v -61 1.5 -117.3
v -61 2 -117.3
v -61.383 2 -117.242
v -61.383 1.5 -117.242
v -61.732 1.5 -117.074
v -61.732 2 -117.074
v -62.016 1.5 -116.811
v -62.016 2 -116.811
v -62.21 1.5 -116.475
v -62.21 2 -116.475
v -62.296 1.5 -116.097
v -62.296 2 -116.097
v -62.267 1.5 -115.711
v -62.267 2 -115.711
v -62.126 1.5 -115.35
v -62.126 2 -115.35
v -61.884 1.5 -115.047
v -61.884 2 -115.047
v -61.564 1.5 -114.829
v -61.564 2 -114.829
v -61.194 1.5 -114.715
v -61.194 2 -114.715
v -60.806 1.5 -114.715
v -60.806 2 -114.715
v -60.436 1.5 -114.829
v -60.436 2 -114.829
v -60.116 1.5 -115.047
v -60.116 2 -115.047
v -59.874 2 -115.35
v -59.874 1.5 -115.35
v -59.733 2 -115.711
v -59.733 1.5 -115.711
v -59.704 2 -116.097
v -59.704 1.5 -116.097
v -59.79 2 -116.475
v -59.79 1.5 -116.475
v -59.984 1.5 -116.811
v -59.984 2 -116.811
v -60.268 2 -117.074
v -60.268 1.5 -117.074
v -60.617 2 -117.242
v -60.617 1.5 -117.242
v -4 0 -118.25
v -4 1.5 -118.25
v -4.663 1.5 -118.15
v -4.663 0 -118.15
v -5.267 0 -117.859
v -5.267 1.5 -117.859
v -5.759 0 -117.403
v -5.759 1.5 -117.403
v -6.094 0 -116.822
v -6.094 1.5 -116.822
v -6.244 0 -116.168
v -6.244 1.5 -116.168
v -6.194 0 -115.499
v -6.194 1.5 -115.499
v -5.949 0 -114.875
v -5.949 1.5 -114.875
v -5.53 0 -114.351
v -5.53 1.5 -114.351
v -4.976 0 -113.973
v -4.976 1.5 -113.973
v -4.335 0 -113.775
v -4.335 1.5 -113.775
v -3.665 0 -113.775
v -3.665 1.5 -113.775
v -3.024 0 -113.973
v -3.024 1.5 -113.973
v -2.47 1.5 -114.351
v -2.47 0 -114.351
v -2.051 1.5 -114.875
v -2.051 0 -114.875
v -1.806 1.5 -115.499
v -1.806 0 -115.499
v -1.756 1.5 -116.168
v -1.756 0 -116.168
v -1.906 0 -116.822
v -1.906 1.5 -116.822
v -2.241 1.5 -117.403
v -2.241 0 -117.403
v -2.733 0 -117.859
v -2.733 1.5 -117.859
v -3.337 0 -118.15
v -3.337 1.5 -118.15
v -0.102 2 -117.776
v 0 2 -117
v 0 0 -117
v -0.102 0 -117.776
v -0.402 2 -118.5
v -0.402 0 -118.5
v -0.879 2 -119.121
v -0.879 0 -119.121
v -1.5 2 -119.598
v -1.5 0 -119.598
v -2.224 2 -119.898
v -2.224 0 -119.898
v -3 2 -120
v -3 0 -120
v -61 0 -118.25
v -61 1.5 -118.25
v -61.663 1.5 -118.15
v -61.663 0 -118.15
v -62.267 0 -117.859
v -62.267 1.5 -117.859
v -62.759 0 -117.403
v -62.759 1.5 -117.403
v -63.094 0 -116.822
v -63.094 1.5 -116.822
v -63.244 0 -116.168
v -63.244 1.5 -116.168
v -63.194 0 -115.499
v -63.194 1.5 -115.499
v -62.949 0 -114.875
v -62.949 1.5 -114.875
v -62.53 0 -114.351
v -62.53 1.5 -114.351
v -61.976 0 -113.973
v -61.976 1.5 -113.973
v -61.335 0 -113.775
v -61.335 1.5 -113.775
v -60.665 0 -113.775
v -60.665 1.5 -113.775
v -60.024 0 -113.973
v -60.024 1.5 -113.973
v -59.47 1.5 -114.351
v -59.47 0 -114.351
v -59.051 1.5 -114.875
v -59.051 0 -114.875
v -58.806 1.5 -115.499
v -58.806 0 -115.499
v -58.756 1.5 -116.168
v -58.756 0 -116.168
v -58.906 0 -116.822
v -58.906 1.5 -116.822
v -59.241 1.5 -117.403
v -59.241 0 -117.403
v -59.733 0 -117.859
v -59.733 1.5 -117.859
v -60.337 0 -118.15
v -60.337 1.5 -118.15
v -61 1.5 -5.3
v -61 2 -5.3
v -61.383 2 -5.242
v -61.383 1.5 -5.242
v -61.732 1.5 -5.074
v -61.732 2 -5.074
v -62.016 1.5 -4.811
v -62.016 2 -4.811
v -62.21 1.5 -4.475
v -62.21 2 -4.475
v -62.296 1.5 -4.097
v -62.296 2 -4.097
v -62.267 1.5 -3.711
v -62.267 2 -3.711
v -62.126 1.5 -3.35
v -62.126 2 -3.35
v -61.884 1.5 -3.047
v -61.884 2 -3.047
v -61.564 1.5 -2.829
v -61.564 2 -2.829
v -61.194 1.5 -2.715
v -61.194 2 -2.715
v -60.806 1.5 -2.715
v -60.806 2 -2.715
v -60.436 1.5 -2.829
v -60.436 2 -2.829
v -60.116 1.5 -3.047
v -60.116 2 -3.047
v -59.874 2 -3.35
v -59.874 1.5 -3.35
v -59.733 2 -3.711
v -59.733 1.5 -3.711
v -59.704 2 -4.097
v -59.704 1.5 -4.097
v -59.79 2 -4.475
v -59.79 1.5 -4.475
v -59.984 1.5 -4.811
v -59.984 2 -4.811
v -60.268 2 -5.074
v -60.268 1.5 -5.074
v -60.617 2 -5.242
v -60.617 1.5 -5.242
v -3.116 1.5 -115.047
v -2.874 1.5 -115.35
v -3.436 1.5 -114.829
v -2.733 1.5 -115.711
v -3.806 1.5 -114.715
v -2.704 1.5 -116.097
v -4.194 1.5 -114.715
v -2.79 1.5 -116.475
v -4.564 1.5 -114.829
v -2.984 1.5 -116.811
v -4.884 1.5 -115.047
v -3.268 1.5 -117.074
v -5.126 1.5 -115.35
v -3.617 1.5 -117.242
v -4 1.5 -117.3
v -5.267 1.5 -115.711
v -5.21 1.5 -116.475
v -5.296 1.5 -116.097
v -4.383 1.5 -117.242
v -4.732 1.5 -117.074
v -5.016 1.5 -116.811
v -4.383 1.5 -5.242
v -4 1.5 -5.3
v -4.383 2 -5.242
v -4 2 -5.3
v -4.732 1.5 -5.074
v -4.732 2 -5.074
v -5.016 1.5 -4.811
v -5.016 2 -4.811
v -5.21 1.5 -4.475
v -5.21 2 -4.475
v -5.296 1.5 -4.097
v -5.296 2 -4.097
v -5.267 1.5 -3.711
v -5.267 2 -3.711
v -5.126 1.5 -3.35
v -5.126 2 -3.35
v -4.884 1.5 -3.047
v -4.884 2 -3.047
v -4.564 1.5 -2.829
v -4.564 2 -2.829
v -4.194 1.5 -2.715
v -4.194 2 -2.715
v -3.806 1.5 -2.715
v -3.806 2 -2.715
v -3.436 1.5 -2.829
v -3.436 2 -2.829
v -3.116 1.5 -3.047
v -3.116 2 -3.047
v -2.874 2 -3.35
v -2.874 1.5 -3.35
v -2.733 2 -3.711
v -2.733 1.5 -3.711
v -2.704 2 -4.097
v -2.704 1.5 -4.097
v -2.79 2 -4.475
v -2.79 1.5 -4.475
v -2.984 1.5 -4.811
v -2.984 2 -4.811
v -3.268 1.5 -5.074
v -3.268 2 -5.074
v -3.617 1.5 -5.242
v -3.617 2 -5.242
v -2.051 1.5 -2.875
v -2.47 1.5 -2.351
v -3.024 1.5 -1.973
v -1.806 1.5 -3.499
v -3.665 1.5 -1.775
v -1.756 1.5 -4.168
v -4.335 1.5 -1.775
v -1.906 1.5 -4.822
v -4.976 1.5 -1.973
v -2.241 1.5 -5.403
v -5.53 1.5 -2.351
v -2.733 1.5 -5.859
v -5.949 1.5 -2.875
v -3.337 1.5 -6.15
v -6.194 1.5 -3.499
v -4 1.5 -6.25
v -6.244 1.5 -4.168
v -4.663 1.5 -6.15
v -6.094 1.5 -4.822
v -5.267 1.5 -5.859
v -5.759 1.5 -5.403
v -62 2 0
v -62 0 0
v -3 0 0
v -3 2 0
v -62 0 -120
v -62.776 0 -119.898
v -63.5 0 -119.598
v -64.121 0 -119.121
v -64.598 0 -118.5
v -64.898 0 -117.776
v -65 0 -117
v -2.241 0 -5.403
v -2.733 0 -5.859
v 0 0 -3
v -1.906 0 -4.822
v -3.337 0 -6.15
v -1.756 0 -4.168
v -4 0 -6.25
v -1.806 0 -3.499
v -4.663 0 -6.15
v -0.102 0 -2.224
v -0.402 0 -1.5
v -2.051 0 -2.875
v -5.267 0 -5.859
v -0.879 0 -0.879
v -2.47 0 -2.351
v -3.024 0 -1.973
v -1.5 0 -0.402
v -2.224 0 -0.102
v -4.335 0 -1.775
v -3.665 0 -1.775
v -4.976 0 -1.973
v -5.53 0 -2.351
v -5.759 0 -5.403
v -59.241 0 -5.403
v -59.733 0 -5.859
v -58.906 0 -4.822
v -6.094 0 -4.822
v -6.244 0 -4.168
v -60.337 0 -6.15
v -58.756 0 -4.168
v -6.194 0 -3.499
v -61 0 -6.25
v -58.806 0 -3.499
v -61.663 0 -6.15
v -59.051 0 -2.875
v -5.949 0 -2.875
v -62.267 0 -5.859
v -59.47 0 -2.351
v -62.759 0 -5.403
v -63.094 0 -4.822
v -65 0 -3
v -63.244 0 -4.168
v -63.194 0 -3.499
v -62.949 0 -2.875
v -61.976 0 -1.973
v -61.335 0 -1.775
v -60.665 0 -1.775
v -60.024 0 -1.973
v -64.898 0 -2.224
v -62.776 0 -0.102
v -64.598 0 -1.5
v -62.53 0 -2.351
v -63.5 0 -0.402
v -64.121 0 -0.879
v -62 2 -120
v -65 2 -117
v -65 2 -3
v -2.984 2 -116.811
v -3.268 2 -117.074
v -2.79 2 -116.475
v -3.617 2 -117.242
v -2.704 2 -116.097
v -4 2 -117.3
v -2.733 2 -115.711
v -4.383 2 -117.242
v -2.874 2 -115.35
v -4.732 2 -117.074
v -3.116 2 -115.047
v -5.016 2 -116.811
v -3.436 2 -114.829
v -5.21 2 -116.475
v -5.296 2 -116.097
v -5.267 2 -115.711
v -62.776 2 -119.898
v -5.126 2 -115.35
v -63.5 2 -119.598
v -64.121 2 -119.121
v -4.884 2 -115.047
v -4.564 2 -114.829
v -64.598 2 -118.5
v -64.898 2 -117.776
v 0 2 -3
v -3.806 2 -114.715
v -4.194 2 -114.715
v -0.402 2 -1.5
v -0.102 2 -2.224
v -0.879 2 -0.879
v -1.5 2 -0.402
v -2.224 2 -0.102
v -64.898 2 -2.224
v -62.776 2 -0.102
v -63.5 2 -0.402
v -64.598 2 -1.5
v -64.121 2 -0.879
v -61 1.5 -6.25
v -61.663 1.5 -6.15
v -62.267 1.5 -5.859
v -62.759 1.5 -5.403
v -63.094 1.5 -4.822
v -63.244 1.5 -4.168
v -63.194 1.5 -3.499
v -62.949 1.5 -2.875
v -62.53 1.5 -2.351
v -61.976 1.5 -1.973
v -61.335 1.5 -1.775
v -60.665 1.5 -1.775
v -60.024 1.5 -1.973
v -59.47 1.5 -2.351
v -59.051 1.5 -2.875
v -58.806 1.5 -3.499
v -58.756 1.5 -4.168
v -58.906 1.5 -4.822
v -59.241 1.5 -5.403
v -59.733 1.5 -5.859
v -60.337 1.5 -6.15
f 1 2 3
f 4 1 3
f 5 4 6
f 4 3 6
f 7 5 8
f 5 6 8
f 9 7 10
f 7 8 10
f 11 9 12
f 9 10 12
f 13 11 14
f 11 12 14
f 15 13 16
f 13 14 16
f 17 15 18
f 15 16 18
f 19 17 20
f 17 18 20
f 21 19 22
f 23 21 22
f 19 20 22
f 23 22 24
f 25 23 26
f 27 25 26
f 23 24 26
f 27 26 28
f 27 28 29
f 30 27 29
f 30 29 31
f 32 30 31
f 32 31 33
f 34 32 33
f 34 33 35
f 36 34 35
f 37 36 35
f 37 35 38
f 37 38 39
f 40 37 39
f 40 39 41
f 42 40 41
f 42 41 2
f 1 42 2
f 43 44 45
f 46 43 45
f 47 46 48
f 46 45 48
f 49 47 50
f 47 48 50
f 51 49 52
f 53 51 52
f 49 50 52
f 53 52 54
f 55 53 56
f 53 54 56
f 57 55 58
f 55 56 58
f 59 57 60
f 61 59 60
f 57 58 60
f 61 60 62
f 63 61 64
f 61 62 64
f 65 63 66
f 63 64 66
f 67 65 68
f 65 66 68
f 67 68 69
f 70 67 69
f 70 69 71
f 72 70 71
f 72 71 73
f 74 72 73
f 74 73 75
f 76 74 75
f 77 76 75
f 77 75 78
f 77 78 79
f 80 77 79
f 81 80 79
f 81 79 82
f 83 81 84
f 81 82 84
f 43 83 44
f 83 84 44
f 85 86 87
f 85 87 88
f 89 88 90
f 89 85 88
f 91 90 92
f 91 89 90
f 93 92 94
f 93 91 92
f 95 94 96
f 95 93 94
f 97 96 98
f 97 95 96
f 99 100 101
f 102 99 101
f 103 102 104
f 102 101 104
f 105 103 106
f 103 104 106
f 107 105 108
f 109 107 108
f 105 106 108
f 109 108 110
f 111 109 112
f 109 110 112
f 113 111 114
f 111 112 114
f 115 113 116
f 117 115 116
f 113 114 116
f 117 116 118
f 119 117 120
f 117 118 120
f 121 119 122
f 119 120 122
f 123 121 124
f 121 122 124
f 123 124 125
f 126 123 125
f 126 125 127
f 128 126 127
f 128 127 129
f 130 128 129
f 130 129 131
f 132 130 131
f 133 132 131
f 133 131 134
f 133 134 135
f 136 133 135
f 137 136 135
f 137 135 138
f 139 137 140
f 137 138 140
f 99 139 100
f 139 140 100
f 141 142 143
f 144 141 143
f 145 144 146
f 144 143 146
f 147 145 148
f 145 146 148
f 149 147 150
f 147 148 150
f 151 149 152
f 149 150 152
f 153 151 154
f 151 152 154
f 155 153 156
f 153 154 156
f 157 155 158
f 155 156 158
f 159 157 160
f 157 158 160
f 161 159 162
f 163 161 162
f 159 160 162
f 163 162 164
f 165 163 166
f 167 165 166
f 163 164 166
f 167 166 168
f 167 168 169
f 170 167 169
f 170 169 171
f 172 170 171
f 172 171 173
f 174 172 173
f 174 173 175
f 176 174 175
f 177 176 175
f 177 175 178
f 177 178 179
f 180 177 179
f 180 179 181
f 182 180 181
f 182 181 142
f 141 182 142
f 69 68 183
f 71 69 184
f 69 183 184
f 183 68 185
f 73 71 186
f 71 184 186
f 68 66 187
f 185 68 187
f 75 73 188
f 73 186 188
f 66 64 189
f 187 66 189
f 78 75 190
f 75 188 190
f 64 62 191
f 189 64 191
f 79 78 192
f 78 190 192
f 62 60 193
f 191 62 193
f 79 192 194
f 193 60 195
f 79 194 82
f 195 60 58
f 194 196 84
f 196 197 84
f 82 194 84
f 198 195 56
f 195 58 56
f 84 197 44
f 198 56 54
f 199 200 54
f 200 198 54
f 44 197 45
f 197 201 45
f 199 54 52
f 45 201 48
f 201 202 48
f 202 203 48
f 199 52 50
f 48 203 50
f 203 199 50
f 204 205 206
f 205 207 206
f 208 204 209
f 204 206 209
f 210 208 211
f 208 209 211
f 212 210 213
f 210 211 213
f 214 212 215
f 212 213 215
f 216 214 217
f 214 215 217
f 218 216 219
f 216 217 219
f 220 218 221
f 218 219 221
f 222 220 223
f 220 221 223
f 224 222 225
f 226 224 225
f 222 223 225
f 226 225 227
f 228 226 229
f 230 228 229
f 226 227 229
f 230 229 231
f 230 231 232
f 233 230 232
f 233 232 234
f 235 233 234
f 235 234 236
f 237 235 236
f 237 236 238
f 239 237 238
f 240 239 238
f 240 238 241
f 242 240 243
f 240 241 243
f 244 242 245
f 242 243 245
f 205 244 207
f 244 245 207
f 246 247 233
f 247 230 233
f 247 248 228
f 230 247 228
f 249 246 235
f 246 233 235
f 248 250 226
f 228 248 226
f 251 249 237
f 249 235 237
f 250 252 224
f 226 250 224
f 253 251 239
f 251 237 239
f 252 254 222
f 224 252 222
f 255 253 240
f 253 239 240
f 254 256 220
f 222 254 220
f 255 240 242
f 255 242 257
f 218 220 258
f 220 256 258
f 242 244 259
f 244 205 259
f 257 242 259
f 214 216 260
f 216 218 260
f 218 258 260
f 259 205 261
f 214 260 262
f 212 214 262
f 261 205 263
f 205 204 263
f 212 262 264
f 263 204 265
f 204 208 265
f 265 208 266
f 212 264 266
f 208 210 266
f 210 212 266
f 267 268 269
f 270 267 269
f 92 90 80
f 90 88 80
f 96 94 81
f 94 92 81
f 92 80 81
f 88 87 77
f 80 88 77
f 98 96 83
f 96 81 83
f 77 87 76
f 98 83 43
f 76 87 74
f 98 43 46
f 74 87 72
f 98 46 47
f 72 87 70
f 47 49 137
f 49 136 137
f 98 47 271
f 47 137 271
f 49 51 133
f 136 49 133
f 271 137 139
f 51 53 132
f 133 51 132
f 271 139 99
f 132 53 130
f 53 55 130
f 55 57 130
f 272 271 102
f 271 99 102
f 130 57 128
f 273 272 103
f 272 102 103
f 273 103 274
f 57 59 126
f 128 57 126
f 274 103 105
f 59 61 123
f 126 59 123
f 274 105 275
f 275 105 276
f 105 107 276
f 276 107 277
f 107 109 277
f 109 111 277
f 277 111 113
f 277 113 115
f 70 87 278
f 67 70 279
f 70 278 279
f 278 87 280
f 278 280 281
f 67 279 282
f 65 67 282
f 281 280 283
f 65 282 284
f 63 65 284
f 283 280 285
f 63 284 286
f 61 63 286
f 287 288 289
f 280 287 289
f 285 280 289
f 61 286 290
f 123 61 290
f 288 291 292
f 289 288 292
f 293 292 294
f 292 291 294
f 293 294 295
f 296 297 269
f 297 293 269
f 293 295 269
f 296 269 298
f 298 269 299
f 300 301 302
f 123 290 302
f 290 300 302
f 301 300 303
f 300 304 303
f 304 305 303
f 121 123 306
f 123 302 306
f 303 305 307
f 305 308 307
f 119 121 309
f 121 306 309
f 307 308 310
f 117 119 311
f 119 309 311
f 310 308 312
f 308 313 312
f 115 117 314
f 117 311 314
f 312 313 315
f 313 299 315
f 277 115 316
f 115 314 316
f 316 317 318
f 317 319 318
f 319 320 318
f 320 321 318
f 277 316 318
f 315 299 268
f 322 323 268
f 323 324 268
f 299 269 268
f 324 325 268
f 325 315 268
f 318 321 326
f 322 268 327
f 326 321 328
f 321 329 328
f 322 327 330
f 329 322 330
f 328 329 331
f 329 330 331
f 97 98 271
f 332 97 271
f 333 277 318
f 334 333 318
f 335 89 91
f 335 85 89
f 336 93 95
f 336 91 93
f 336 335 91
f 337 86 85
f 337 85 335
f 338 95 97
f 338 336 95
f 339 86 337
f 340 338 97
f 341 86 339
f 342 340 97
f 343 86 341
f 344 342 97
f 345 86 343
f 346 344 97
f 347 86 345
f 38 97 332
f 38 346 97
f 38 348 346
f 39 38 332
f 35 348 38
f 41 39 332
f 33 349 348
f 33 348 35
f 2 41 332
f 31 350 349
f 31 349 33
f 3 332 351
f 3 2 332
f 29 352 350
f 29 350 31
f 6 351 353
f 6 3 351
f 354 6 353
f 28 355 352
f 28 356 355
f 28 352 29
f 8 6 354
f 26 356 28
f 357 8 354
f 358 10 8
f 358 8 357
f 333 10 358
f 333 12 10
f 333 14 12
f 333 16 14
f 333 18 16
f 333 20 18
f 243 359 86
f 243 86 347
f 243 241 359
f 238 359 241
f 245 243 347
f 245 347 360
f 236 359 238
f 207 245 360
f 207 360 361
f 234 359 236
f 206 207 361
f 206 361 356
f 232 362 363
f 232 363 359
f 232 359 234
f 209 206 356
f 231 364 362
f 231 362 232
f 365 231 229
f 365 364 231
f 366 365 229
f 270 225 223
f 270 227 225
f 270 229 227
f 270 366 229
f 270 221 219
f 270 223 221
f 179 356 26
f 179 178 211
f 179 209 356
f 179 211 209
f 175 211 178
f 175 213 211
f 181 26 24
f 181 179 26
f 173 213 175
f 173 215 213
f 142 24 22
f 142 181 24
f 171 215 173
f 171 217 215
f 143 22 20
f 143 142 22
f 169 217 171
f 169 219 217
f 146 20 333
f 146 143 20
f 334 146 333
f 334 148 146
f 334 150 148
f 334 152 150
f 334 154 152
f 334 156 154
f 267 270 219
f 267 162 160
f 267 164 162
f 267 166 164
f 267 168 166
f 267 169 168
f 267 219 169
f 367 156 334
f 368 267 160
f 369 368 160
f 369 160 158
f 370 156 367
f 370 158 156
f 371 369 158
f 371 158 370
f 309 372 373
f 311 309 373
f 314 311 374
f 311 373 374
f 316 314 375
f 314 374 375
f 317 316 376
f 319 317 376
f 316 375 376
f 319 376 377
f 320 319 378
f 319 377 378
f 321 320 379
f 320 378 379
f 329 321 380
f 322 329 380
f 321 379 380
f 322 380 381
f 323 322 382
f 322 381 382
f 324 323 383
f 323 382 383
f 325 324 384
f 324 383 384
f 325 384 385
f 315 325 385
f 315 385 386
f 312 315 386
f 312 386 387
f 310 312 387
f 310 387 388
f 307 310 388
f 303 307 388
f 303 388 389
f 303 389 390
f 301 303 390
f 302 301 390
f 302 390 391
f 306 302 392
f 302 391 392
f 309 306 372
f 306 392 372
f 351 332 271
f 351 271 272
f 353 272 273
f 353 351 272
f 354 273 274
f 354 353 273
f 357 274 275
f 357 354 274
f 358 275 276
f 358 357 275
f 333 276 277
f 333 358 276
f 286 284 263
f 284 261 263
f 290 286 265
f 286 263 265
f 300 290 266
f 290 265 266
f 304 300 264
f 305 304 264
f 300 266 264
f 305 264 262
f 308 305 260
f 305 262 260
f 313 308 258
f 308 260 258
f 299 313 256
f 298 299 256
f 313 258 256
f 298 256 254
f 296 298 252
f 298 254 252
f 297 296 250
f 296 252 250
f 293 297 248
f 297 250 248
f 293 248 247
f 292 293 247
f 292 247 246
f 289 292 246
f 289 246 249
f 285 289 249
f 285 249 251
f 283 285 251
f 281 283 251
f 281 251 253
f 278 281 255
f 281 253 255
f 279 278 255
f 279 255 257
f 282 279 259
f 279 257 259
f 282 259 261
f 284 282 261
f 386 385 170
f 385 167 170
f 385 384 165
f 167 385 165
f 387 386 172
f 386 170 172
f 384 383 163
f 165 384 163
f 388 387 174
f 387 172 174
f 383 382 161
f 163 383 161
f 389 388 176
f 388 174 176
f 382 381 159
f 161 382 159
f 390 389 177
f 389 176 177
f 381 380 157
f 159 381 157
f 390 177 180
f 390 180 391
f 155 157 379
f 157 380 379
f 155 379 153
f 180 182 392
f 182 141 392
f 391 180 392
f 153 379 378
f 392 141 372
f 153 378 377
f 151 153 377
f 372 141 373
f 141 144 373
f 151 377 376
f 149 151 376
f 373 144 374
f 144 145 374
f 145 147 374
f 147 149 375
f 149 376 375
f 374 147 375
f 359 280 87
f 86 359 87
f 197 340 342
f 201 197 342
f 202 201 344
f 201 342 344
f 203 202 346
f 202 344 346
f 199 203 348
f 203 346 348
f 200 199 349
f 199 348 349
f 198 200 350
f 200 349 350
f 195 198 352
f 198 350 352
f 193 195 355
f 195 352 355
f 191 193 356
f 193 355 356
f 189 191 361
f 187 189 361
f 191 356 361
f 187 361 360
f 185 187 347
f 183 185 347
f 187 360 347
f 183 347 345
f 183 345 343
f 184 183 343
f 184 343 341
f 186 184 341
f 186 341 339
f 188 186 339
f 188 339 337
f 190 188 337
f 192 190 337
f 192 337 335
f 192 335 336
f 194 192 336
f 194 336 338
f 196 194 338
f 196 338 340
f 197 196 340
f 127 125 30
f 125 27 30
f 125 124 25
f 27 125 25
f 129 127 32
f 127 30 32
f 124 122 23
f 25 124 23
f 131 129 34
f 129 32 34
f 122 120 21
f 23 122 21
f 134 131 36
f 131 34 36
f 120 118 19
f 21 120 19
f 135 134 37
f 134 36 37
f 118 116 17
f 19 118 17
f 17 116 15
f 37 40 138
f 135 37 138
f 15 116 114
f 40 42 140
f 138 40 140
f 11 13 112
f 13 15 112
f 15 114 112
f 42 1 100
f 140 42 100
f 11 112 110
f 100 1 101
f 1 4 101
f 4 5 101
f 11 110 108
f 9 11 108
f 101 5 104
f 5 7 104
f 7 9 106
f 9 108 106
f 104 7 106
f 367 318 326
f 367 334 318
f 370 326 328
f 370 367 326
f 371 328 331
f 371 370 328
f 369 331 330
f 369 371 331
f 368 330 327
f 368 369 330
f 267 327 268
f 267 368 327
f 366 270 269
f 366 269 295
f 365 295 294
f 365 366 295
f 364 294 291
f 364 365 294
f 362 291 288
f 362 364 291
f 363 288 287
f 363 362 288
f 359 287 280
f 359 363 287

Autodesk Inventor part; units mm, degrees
ref_plane "YZ Plane" through (0, 0, 0) normal (1, 0, 0) x (0, 1, 0)
ref_plane "XZ Plane" through (0, 0, 0) normal (0, 1, 0) x (-1, 0, 0)
ref_plane "XY Plane" through (0, 0, 0) normal (0, 0, 1) x (1, 0, 0)
sketch "Szkic1" plane through (0, 0, 0) normal (0, 1, 0) x (-1, 0, 0)
  line L0 (65, 0) -> (0, 0)
  line L1 (0, 0) -> (0, -120)
  line L2 (0, -120) -> (65, -120)
  line L3 (65, -120) -> (65, 0)
  dimension "d0" = 120
  dimension "d1" = 65
extrude "Gabaryt" add sketch "Szkic1" along normal blind 2
sketch "Szkic2" plane through (0, 0, 0) normal (0, 1, 0) x (1, 0, 0)
  line L0 (0, 0) -> (0, 120) projected
  line L1 (-65, 0) -> (0, 0) projected
  line L2 (-65, 120) -> (-65, 0) projected
  line L3 (0, 120) -> (-65, 120) projected
  line L4 (-65, 60) -> (0, 60)
  line L5 (-32.5, 120) -> (-32.5, 0)
  point P0 (-4, 4)
  point P1 (-61, 4)
  point P2 (-4, 116)
  point P3 (-61, 116)
  dimension "d4" = 4
  dimension "d5" = 4
hole "Otwory montażowe" at (-4, 0, -4) at (-61, 0, -4) at (-61, 0, -116) at (-4, 0, -116) direction (0, 1, 0) diameter 2.6 end through all counterbore diameter 4.5 counterbore depth 1.5
fillet "Zaokrąglenie1" radius 3 4 edges at (0, 1, 0) (-65, 1, 0) (-65, 1, -120) (0, 1, -120)
equation "\"d0\" = podstawa_a"
equation "\"d1\" = podstawa_b"
equation "\"d2\" = podstawa_wys"
equation "\"d4\" = podstawa_otwory_montazowe_poz_x"
equation "\"d5\" = podstawa_otwory_montazowe_poz_y"
equation "\"d6\" = gniazdo_M2_D2"
equation "\"d8\" = gniazdo_M2_D1"
equation "\"d9\" = gniazdo_M2_glebokosc"
equation "\"d13\" = podstawa_zaokraglenie"
equation "\"podstawa_a\" = 120"
equation "\"podstawa_b\" = 65"
equation "\"podstawa_wys\" = 2"
equation "\"podstawa_otwory_montazowe_poz_y\" = 4"
equation "\"podstawa_otwory_montazowe_poz_x\" = 4"
equation "\"gniazdo_M2_D1\" = 4.5"
equation "\"gniazdo_M2_glebokosc\" = 1.5"
equation "\"gniazdo_M2_D2\" = 2.6"
equation "\"obudowa_b\" = 65"
equation "\"obudowa_wys\" = 36"
equation "\"obudowa_grubosc\" = 2"
equation "\"obudowa_prowadnica_odsuniecie\" = 2"
equation "\"obudowa_prowadnica_grubosc\" = 2"
equation "\"obudowa_kontrolki_a\" = 38"
equation "\"obudowa_prowadnica_wys\" = 19"
equation "\"obudowa_otwory_montazowe_poz_y\" = 4"
equation "\"obudowa_otwory_montazowe_poz_x\" = 4"
equation "\"obudowa_otwory_montazowe_material_y\" = 8"
equation "\"obudowa_otwory_montazowe_material_x\" = 8"
equation "\"insert_D\" = 2.4"
equation "\"insert_glebokosc\" = 5.5"
equation "\"obudowa_zaokraglenie\" = 3"
equation "\"podstawa_zaokraglenie\" = 3"
equation "\"obudowa_otwory_io_wys\" = 15"
equation "\"obudowa_otwory_io_D\" = 15"
equation "\"obudowa_otwory_io1_wys\" = 15"
equation "\"obudowa_otwory_io1_D\" = 11.5"
equation "\"obudowa_otwory_io2_wys\" = 15"
equation "\"obudowa_otwory_io2_D\" = 11.5"
equation "\"obudowa_otwory_pot_D\" = 8"
equation "\"input_b\" = 14.4"
equation "\"input_wys\" = 11"
equation "\"input_a\" = 9"
properties part number "podstawa" material "Tworzywo sztuczne PET"
